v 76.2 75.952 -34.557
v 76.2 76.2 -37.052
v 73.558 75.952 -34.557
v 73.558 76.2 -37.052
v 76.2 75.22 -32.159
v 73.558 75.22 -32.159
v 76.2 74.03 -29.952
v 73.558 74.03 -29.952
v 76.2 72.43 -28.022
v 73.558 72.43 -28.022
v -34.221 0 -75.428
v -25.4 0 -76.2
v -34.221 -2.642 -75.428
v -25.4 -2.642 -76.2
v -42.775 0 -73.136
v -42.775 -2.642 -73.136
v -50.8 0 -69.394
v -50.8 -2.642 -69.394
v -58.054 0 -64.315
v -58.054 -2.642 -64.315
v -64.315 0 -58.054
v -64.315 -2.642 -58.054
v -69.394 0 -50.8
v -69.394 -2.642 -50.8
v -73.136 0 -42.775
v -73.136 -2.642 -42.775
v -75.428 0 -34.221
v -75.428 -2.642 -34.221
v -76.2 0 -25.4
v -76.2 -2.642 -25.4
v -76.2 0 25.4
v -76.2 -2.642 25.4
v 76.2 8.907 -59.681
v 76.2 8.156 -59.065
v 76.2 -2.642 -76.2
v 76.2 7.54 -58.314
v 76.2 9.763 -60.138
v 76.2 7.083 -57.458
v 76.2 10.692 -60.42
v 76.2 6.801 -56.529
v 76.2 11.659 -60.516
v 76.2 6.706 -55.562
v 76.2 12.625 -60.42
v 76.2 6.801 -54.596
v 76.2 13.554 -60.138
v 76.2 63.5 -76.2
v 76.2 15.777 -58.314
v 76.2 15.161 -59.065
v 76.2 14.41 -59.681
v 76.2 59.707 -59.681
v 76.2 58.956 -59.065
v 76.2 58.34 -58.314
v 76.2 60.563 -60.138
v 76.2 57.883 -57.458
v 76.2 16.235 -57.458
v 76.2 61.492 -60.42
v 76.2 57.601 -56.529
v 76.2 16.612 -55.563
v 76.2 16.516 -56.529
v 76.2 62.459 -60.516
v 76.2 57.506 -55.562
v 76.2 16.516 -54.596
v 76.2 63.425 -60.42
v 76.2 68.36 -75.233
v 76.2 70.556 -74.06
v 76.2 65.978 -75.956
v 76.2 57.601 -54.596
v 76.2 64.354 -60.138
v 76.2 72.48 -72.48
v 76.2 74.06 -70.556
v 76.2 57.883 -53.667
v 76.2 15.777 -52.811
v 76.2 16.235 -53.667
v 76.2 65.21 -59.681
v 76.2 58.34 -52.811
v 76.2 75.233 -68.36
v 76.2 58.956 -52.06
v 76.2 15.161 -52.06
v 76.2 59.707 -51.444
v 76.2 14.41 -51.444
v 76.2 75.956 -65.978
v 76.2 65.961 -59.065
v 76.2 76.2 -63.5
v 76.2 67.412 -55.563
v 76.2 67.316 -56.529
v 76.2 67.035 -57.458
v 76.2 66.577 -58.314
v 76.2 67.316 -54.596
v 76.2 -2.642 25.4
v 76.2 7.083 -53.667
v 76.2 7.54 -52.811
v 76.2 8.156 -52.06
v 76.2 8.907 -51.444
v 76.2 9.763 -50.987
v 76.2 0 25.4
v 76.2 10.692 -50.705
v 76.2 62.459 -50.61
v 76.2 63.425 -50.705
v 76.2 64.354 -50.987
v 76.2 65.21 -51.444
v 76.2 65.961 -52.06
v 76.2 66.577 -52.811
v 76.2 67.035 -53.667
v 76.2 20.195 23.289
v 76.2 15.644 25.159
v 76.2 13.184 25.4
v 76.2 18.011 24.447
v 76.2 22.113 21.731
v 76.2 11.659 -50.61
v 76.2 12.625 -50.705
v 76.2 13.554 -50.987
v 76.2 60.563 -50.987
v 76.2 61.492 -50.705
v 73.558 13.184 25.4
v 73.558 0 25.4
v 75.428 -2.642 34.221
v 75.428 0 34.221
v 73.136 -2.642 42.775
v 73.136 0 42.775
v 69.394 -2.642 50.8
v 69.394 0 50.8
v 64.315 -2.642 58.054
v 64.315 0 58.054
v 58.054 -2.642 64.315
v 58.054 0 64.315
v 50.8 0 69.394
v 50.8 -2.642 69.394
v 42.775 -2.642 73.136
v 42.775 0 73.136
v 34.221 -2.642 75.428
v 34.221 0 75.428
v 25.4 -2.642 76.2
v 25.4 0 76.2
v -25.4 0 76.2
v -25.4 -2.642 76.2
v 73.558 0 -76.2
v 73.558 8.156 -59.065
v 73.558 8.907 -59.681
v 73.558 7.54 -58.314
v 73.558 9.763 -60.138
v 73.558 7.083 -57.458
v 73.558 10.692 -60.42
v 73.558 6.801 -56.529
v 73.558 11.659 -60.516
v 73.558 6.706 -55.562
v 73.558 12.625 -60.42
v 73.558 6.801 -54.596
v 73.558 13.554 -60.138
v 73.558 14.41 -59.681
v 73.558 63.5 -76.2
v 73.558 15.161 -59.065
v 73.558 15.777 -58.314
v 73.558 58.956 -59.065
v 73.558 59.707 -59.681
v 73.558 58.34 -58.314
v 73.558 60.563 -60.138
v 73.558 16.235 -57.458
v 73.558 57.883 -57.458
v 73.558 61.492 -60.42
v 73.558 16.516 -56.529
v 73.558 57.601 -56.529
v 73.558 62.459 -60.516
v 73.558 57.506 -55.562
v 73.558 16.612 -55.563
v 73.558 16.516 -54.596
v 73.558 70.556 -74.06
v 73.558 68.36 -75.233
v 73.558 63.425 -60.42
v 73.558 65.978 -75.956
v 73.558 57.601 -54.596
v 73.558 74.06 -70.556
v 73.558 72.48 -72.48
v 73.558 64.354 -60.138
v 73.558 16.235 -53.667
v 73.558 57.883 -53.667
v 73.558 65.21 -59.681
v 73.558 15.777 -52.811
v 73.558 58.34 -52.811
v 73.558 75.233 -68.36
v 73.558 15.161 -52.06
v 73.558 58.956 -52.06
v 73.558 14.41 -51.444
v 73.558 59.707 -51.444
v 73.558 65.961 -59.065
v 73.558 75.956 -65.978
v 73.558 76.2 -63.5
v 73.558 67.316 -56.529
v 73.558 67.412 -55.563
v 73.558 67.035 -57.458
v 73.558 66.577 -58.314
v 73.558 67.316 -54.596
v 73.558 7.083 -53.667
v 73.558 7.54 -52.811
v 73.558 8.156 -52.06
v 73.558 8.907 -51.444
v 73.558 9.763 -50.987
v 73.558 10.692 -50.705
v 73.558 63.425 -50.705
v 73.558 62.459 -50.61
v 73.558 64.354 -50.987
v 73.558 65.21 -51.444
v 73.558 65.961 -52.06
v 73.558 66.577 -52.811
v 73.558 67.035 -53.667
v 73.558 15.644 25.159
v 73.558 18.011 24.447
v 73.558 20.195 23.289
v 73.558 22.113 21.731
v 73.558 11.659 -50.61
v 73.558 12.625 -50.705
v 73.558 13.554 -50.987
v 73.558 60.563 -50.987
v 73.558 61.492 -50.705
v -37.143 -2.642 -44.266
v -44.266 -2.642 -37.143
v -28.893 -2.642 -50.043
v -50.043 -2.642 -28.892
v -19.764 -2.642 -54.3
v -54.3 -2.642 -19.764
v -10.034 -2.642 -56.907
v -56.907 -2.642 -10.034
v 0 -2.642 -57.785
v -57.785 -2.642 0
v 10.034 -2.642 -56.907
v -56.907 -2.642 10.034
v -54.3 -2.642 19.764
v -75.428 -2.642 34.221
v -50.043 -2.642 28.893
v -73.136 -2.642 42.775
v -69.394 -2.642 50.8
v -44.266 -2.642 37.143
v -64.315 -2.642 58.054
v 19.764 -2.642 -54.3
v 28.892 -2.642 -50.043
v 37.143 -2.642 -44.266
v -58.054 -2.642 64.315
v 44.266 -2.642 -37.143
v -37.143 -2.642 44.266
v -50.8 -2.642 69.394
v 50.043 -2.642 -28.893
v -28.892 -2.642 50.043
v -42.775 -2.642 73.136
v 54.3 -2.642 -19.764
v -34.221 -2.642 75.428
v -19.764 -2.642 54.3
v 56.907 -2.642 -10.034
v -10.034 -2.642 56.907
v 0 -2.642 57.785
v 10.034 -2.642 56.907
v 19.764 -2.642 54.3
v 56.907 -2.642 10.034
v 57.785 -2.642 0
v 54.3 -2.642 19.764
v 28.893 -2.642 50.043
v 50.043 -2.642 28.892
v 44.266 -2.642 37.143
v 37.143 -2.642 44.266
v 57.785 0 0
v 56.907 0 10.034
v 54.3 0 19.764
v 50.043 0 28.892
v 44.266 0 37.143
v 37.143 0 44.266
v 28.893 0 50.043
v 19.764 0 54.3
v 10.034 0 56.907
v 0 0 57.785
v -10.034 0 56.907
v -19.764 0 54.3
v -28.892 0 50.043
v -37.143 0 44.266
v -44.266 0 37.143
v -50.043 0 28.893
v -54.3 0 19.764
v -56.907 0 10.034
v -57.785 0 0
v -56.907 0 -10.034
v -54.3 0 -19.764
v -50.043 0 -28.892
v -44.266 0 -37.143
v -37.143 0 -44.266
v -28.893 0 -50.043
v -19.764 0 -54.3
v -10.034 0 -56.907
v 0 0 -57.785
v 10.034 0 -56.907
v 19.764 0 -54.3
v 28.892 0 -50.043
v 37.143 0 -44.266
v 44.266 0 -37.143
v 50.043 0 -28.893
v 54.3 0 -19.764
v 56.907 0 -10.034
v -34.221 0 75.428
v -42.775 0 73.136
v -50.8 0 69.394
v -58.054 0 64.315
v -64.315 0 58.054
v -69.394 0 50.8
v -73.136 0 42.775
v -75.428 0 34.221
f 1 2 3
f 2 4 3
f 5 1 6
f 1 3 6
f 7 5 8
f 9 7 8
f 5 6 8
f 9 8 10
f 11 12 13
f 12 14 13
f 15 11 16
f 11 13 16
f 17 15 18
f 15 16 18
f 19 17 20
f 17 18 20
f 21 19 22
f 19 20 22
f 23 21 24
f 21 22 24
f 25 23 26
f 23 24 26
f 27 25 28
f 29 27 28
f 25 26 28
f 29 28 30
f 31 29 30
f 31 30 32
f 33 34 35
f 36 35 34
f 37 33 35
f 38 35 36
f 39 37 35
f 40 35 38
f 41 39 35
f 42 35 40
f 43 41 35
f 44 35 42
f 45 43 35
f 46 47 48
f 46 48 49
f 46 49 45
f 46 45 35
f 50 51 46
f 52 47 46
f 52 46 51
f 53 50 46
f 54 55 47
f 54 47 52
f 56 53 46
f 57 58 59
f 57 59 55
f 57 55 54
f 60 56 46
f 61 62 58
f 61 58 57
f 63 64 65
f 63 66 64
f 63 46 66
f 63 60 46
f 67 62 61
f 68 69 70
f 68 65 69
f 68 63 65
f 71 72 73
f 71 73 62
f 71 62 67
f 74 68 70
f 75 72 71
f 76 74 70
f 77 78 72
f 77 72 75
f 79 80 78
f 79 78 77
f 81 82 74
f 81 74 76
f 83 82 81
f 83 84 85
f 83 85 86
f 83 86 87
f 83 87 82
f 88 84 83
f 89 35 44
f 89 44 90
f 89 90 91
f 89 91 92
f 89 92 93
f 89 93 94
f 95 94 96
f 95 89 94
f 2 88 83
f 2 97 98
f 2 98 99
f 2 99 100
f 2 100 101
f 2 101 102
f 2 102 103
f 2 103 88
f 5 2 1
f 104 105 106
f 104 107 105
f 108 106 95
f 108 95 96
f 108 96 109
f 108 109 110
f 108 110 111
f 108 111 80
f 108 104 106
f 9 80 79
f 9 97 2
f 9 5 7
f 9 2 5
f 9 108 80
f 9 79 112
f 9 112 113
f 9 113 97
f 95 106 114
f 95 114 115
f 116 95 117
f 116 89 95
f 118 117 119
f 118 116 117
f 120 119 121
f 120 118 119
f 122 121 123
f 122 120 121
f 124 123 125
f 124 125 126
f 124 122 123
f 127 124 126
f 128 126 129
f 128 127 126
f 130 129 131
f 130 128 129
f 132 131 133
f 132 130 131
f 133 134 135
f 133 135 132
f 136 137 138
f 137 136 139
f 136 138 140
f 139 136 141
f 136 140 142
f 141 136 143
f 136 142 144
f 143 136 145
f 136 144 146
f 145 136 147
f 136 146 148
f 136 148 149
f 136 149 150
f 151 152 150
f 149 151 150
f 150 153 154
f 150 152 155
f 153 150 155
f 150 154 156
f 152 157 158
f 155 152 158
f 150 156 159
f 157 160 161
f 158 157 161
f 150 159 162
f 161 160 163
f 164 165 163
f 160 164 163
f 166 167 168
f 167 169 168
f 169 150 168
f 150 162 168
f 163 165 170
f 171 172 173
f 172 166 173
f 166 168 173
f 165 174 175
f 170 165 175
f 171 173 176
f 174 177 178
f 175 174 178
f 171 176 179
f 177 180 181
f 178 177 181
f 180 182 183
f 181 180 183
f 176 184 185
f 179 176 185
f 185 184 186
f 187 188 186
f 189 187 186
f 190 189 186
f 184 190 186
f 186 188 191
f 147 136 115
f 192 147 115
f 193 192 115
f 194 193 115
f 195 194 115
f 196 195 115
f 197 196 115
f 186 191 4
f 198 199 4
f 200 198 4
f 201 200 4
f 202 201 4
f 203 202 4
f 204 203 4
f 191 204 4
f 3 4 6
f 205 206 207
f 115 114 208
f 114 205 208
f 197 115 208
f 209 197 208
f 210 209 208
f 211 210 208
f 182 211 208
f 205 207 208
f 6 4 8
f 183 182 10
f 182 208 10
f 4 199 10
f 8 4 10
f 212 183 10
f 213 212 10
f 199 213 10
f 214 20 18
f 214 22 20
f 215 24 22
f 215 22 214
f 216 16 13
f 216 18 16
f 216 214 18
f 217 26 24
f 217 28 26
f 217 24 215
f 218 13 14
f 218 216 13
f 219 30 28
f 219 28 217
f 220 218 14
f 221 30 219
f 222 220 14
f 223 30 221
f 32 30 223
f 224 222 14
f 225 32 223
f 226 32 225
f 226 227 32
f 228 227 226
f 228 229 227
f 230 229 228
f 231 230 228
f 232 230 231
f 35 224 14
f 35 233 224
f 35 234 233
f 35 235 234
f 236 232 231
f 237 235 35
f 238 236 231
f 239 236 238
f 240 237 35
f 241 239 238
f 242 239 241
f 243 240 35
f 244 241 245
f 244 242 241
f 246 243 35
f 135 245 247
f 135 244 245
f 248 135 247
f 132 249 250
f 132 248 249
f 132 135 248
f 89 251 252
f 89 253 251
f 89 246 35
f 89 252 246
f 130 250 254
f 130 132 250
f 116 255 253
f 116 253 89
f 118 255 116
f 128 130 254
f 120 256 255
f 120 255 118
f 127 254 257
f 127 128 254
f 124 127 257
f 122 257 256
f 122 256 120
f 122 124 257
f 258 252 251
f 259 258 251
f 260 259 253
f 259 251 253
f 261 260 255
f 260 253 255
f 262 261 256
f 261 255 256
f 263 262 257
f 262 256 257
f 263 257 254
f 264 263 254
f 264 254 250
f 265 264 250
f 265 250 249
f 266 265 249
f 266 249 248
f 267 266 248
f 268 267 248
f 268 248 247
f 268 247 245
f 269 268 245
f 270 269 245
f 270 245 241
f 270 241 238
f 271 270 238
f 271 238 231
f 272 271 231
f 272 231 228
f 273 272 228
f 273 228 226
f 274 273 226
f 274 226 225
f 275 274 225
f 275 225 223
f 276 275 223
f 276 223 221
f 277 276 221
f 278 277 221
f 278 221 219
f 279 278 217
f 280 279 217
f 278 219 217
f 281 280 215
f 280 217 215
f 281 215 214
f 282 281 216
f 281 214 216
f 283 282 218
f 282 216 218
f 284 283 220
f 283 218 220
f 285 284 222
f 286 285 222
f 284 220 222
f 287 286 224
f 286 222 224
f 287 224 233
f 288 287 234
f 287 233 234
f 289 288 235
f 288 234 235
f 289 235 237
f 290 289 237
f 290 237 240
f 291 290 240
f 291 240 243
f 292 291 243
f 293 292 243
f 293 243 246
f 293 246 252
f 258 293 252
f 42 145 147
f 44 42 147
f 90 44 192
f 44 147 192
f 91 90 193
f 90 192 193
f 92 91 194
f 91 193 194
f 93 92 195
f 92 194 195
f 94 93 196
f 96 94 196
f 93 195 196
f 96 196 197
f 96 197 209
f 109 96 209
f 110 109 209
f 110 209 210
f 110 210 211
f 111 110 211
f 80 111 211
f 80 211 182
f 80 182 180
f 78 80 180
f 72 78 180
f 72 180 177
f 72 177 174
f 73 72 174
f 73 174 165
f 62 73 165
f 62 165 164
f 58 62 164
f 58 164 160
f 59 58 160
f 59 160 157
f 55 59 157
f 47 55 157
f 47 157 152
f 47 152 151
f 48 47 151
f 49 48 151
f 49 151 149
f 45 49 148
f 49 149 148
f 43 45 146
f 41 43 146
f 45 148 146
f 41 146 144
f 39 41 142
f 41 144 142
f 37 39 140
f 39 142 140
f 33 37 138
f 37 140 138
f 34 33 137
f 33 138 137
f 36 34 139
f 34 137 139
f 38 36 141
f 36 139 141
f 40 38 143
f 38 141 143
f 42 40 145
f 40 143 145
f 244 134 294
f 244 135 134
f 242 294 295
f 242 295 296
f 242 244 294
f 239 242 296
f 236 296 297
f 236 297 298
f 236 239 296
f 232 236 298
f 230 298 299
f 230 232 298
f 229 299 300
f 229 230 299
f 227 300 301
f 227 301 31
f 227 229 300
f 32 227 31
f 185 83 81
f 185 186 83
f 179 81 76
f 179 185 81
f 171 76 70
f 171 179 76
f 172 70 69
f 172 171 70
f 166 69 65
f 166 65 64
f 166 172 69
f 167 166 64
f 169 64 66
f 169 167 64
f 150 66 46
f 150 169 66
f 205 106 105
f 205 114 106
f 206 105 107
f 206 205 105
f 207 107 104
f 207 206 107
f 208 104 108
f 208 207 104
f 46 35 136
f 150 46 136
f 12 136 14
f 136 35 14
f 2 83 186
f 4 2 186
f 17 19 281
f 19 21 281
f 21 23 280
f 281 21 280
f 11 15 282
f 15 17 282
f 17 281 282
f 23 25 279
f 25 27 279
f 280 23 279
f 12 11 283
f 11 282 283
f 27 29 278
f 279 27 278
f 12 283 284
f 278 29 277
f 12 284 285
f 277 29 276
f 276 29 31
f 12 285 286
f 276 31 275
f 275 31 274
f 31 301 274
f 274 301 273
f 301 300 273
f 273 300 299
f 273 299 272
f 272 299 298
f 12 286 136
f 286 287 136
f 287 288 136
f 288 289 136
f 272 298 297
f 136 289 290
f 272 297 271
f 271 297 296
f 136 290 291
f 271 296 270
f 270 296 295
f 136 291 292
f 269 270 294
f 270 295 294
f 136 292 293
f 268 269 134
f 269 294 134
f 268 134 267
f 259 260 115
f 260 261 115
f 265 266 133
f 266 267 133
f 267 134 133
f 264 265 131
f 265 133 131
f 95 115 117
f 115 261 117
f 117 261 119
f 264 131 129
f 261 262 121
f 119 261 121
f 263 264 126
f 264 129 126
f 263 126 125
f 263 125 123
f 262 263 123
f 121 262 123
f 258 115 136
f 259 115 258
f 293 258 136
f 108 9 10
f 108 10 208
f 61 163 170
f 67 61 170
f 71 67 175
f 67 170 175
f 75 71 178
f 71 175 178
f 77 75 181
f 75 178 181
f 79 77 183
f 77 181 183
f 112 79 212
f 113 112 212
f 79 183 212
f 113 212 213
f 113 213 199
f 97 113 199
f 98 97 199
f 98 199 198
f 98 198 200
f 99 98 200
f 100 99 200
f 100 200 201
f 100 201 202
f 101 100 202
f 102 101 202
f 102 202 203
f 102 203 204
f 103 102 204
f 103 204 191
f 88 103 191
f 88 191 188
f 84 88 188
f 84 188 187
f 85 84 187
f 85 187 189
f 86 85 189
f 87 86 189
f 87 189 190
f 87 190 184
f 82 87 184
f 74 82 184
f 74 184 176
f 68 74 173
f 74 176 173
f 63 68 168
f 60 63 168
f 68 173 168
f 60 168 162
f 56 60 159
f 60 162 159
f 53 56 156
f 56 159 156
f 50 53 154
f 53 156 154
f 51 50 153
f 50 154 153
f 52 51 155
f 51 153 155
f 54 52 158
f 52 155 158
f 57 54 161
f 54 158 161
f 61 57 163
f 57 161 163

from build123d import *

# Parameters (mm, degrees)
F0_W      = 152.4
F0_H      = 152.4
F1_DEPTH  = 2.6416
F2_W      = 2.6416
F2_H      = 44.45
F3_DEPTH  = 76.2
F4_R      = 57.785
F5_DEPTH  = 25.4
F6_R      = 50.8
F7_R      = 4.953
F8_DEPTH  = 25.4
F10_DEPTH = 2.6416
F11_R     = 12.7


with BuildPart() as f1:
    # F0 (on Front) → F1 (new body)
    with BuildSketch(Plane.XZ):
        Rectangle(F0_W, F0_H)
    extrude(amount=F1_DEPTH)

    # F2 (on face) → F3 (join)
    with BuildSketch(Plane(origin=(0, 0, 0), x_dir=(-1, 0, 0), z_dir=(0, 1, 0))):
        with Locations((-74.8792, -53.975)):
            Rectangle(F2_W, F2_H)
    extrude(amount=F3_DEPTH)

    # F4 (on face) → F5 (cut)
    with BuildSketch(Plane.XZ.offset(2.6416)):
        Circle(F4_R)
    extrude(amount=-F5_DEPTH, mode=Mode.SUBTRACT)

    # F6
    f6_edges = [f1.edges().sort_by_distance(p)[0] for p in [
        (76.2, -1.3208, 76.2),
        (-76.2, -1.3208, 76.2),
        (-76.2, -1.3208, -76.2),
    ]]
    fillet(f6_edges, radius=F6_R)

    # F7 (on face) → F8 (cut)
    with BuildSketch(Plane(origin=(73.5584, 0, 0), x_dir=(0, -1, 0), z_dir=(-1, 0, 0))):
        with Locations((-11.6586, -55.5625)):
            Circle(F7_R)
        with Locations((-62.4586, -55.5625)):
            Circle(F7_R)
    extrude(amount=-F8_DEPTH, mode=Mode.SUBTRACT)

    # F9 (on face) → F10 (join)
    with BuildSketch(Plane.YZ.offset(76.2)):
        Polygon((18.402247, 25.4), (0, 25.4), (0, -31.75), (76.2, -31.75), align=None)
    extrude(amount=-F10_DEPTH)

    # F11
    f11_edges = [f1.edges().sort_by_distance(p)[0] for p in [
        (74.8792, 76.2, -76.2),
        (74.8792, 76.2, -31.75),
        (74.8792, 18.402247, 25.4),
    ]]
    fillet(f11_edges, radius=F11_R)


solid = f1.part
